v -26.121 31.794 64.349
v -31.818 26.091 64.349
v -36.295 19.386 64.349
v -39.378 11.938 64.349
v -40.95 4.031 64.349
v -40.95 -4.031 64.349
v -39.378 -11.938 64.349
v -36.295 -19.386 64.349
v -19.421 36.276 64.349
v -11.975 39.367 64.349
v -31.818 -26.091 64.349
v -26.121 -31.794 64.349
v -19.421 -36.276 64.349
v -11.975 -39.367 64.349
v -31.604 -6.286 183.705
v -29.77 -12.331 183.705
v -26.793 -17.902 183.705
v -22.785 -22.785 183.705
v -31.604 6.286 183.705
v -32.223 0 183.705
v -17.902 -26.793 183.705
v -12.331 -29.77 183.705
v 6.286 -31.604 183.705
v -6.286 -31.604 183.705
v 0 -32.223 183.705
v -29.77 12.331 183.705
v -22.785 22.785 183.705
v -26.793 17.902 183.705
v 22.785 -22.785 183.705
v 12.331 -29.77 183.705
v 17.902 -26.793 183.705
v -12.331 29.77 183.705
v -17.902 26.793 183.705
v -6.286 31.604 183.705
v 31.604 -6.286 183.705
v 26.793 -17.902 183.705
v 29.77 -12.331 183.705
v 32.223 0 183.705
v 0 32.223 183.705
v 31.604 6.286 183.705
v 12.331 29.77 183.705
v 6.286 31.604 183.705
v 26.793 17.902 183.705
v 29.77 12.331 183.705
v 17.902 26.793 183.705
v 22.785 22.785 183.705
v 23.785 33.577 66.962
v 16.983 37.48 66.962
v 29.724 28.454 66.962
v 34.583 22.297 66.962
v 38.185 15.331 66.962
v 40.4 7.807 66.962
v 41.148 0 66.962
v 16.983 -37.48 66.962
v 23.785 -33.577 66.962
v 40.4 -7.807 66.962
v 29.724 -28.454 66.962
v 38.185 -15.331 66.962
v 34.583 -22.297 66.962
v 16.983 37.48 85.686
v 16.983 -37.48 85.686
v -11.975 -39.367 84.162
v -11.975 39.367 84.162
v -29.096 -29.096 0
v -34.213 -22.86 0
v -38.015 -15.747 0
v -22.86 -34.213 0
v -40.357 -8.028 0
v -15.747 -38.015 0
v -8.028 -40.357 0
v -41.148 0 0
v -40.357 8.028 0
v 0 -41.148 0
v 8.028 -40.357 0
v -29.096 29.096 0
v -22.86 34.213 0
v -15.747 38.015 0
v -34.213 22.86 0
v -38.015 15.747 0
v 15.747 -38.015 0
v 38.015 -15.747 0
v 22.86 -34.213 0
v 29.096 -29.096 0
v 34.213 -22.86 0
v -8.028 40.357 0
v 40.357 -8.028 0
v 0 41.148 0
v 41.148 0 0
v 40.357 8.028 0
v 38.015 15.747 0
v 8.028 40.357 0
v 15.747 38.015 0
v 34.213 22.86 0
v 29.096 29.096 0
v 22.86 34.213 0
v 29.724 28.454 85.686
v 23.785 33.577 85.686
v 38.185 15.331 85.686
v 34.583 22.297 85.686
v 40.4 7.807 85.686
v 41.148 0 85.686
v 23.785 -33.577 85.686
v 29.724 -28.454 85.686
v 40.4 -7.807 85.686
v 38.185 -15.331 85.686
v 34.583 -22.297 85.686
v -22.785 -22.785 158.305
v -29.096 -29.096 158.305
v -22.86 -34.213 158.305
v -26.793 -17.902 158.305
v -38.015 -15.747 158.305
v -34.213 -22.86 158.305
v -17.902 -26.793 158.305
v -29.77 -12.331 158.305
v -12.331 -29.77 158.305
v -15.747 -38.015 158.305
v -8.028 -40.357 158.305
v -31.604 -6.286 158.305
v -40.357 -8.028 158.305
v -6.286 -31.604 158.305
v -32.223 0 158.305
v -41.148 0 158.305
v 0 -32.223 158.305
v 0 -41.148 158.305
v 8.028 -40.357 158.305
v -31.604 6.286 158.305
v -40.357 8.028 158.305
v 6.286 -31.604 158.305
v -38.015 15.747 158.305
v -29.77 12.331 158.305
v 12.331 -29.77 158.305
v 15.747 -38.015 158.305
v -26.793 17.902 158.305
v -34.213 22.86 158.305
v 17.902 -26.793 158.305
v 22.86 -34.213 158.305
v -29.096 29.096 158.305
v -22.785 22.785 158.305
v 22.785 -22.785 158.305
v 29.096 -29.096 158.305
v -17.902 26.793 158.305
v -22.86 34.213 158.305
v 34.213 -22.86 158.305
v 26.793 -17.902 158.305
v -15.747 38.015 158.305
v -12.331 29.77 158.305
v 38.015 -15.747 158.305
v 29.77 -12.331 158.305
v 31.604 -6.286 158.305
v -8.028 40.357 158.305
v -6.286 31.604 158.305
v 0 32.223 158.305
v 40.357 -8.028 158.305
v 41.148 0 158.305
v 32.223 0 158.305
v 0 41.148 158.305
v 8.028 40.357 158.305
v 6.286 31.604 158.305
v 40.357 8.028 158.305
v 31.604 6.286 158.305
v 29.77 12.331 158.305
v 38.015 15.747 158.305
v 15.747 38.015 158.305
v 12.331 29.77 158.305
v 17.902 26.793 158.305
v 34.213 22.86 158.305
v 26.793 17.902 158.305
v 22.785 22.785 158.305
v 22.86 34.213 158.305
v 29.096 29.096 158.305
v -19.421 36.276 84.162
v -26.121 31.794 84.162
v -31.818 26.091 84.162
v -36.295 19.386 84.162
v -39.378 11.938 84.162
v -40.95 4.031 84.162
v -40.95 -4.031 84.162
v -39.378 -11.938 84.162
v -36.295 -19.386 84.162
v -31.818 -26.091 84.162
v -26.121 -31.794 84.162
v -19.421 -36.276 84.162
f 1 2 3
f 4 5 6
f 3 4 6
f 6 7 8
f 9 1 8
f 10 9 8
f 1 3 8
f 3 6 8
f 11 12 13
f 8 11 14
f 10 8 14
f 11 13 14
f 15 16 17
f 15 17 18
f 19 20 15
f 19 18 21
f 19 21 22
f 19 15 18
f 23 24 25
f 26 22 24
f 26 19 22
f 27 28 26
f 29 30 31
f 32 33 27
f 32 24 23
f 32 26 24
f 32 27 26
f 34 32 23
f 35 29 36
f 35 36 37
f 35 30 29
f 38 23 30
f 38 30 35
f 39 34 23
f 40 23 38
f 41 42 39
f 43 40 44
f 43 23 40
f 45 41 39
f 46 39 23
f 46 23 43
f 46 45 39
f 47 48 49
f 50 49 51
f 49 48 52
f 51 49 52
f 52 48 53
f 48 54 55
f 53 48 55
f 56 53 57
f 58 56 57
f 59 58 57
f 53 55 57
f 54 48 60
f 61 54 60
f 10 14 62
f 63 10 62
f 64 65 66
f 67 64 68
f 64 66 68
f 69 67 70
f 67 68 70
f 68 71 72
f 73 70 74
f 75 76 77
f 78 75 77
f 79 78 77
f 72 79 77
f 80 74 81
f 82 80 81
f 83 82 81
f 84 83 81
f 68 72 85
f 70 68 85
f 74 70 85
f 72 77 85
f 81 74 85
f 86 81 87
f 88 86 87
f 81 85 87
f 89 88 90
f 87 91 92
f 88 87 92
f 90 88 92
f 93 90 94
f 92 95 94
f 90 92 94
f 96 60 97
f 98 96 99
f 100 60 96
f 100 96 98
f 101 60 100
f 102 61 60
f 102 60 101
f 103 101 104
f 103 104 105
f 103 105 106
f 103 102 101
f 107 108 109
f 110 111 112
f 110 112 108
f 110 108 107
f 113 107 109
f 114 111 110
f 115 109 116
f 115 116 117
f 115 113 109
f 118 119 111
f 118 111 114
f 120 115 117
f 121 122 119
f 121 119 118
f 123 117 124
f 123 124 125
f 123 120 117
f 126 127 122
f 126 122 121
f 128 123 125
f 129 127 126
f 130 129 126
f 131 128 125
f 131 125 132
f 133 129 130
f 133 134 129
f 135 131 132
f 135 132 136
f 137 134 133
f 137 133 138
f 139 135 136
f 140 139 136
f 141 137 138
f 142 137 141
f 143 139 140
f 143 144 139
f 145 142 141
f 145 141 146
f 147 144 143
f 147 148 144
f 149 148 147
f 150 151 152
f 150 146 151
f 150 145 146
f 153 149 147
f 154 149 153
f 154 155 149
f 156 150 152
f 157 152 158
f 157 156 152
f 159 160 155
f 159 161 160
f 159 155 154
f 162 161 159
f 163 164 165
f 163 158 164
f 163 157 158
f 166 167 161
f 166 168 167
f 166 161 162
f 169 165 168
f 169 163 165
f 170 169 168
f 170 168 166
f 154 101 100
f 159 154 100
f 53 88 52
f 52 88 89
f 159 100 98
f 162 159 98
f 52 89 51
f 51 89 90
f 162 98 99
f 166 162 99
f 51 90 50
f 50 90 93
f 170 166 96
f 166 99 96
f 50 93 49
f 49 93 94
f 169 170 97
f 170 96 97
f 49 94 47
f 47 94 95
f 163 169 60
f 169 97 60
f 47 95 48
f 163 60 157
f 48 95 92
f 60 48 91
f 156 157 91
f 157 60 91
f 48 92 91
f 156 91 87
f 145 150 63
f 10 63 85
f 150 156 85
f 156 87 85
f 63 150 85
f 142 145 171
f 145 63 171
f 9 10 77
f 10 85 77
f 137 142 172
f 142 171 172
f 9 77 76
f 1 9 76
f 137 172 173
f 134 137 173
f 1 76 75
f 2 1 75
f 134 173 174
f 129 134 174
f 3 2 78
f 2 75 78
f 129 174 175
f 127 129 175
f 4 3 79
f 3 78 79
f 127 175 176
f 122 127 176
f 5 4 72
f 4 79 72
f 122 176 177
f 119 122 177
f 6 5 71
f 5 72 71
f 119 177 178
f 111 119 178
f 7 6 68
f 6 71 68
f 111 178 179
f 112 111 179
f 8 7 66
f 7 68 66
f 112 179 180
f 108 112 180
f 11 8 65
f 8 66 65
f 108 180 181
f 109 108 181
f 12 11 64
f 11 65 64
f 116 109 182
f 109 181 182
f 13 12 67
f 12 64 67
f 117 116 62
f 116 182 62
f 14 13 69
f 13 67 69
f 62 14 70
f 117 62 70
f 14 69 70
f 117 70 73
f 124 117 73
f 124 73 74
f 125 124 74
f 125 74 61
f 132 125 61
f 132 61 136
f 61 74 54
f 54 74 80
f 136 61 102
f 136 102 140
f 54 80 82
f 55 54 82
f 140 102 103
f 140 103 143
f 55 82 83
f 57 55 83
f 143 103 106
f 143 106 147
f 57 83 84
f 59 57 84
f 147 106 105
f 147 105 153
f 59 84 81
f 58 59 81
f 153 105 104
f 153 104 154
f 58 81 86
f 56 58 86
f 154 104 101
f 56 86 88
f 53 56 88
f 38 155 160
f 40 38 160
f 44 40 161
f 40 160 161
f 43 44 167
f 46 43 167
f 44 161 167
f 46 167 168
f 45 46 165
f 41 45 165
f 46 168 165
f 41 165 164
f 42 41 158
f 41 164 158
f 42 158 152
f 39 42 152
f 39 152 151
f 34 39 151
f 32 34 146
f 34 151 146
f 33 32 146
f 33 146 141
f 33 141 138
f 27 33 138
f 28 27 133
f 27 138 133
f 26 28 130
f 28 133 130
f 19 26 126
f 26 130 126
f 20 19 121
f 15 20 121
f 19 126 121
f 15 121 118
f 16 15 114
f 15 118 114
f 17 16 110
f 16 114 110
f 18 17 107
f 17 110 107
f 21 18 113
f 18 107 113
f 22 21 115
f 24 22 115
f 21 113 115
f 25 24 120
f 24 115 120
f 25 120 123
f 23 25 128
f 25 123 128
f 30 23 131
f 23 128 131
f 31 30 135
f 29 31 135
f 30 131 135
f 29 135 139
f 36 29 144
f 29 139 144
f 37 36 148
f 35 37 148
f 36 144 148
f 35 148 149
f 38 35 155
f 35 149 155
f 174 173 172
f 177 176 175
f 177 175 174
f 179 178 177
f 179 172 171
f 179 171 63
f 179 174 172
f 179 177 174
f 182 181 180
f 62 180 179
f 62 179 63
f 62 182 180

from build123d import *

# Parameters (mm, degrees)
F0_R     = 41.14767
F1_DEPTH = 158.304572
F2_W     = 30.046224
F2_H     = 18.724471
F3_DEPTH = 635
F4_W     = 39.408475
F4_H     = 19.81309
F5_DEPTH = 63.5
F6_R     = 32.223353
F7_DEPTH = 25.4


with BuildPart() as f1:
    # F0 (on Top) → F1 (new body)
    with BuildSketch(Plane.XY):
        Circle(F0_R)
    extrude(amount=F1_DEPTH)

    # F2 (on Front) → F3 (cut, symmetric)
    with BuildSketch(Plane.XZ):
        with Locations((32.005787, 76.323956)):
            Rectangle(F2_W, F2_H)
    extrude(amount=F3_DEPTH, both=True, mode=Mode.SUBTRACT)

    # F4 (on Front) → F5 (cut, symmetric)
    with BuildSketch(Plane.XZ):
        with Locations((-31.679184, 74.255556)):
            Rectangle(F4_W, F4_H)
    extrude(amount=F5_DEPTH, both=True, mode=Mode.SUBTRACT)

    # F6 (on face) → F7 (join)
    with BuildSketch(Plane.XY.offset(158.304572)):
        Circle(F6_R)
    extrude(amount=F7_DEPTH)


solid = f1.part
